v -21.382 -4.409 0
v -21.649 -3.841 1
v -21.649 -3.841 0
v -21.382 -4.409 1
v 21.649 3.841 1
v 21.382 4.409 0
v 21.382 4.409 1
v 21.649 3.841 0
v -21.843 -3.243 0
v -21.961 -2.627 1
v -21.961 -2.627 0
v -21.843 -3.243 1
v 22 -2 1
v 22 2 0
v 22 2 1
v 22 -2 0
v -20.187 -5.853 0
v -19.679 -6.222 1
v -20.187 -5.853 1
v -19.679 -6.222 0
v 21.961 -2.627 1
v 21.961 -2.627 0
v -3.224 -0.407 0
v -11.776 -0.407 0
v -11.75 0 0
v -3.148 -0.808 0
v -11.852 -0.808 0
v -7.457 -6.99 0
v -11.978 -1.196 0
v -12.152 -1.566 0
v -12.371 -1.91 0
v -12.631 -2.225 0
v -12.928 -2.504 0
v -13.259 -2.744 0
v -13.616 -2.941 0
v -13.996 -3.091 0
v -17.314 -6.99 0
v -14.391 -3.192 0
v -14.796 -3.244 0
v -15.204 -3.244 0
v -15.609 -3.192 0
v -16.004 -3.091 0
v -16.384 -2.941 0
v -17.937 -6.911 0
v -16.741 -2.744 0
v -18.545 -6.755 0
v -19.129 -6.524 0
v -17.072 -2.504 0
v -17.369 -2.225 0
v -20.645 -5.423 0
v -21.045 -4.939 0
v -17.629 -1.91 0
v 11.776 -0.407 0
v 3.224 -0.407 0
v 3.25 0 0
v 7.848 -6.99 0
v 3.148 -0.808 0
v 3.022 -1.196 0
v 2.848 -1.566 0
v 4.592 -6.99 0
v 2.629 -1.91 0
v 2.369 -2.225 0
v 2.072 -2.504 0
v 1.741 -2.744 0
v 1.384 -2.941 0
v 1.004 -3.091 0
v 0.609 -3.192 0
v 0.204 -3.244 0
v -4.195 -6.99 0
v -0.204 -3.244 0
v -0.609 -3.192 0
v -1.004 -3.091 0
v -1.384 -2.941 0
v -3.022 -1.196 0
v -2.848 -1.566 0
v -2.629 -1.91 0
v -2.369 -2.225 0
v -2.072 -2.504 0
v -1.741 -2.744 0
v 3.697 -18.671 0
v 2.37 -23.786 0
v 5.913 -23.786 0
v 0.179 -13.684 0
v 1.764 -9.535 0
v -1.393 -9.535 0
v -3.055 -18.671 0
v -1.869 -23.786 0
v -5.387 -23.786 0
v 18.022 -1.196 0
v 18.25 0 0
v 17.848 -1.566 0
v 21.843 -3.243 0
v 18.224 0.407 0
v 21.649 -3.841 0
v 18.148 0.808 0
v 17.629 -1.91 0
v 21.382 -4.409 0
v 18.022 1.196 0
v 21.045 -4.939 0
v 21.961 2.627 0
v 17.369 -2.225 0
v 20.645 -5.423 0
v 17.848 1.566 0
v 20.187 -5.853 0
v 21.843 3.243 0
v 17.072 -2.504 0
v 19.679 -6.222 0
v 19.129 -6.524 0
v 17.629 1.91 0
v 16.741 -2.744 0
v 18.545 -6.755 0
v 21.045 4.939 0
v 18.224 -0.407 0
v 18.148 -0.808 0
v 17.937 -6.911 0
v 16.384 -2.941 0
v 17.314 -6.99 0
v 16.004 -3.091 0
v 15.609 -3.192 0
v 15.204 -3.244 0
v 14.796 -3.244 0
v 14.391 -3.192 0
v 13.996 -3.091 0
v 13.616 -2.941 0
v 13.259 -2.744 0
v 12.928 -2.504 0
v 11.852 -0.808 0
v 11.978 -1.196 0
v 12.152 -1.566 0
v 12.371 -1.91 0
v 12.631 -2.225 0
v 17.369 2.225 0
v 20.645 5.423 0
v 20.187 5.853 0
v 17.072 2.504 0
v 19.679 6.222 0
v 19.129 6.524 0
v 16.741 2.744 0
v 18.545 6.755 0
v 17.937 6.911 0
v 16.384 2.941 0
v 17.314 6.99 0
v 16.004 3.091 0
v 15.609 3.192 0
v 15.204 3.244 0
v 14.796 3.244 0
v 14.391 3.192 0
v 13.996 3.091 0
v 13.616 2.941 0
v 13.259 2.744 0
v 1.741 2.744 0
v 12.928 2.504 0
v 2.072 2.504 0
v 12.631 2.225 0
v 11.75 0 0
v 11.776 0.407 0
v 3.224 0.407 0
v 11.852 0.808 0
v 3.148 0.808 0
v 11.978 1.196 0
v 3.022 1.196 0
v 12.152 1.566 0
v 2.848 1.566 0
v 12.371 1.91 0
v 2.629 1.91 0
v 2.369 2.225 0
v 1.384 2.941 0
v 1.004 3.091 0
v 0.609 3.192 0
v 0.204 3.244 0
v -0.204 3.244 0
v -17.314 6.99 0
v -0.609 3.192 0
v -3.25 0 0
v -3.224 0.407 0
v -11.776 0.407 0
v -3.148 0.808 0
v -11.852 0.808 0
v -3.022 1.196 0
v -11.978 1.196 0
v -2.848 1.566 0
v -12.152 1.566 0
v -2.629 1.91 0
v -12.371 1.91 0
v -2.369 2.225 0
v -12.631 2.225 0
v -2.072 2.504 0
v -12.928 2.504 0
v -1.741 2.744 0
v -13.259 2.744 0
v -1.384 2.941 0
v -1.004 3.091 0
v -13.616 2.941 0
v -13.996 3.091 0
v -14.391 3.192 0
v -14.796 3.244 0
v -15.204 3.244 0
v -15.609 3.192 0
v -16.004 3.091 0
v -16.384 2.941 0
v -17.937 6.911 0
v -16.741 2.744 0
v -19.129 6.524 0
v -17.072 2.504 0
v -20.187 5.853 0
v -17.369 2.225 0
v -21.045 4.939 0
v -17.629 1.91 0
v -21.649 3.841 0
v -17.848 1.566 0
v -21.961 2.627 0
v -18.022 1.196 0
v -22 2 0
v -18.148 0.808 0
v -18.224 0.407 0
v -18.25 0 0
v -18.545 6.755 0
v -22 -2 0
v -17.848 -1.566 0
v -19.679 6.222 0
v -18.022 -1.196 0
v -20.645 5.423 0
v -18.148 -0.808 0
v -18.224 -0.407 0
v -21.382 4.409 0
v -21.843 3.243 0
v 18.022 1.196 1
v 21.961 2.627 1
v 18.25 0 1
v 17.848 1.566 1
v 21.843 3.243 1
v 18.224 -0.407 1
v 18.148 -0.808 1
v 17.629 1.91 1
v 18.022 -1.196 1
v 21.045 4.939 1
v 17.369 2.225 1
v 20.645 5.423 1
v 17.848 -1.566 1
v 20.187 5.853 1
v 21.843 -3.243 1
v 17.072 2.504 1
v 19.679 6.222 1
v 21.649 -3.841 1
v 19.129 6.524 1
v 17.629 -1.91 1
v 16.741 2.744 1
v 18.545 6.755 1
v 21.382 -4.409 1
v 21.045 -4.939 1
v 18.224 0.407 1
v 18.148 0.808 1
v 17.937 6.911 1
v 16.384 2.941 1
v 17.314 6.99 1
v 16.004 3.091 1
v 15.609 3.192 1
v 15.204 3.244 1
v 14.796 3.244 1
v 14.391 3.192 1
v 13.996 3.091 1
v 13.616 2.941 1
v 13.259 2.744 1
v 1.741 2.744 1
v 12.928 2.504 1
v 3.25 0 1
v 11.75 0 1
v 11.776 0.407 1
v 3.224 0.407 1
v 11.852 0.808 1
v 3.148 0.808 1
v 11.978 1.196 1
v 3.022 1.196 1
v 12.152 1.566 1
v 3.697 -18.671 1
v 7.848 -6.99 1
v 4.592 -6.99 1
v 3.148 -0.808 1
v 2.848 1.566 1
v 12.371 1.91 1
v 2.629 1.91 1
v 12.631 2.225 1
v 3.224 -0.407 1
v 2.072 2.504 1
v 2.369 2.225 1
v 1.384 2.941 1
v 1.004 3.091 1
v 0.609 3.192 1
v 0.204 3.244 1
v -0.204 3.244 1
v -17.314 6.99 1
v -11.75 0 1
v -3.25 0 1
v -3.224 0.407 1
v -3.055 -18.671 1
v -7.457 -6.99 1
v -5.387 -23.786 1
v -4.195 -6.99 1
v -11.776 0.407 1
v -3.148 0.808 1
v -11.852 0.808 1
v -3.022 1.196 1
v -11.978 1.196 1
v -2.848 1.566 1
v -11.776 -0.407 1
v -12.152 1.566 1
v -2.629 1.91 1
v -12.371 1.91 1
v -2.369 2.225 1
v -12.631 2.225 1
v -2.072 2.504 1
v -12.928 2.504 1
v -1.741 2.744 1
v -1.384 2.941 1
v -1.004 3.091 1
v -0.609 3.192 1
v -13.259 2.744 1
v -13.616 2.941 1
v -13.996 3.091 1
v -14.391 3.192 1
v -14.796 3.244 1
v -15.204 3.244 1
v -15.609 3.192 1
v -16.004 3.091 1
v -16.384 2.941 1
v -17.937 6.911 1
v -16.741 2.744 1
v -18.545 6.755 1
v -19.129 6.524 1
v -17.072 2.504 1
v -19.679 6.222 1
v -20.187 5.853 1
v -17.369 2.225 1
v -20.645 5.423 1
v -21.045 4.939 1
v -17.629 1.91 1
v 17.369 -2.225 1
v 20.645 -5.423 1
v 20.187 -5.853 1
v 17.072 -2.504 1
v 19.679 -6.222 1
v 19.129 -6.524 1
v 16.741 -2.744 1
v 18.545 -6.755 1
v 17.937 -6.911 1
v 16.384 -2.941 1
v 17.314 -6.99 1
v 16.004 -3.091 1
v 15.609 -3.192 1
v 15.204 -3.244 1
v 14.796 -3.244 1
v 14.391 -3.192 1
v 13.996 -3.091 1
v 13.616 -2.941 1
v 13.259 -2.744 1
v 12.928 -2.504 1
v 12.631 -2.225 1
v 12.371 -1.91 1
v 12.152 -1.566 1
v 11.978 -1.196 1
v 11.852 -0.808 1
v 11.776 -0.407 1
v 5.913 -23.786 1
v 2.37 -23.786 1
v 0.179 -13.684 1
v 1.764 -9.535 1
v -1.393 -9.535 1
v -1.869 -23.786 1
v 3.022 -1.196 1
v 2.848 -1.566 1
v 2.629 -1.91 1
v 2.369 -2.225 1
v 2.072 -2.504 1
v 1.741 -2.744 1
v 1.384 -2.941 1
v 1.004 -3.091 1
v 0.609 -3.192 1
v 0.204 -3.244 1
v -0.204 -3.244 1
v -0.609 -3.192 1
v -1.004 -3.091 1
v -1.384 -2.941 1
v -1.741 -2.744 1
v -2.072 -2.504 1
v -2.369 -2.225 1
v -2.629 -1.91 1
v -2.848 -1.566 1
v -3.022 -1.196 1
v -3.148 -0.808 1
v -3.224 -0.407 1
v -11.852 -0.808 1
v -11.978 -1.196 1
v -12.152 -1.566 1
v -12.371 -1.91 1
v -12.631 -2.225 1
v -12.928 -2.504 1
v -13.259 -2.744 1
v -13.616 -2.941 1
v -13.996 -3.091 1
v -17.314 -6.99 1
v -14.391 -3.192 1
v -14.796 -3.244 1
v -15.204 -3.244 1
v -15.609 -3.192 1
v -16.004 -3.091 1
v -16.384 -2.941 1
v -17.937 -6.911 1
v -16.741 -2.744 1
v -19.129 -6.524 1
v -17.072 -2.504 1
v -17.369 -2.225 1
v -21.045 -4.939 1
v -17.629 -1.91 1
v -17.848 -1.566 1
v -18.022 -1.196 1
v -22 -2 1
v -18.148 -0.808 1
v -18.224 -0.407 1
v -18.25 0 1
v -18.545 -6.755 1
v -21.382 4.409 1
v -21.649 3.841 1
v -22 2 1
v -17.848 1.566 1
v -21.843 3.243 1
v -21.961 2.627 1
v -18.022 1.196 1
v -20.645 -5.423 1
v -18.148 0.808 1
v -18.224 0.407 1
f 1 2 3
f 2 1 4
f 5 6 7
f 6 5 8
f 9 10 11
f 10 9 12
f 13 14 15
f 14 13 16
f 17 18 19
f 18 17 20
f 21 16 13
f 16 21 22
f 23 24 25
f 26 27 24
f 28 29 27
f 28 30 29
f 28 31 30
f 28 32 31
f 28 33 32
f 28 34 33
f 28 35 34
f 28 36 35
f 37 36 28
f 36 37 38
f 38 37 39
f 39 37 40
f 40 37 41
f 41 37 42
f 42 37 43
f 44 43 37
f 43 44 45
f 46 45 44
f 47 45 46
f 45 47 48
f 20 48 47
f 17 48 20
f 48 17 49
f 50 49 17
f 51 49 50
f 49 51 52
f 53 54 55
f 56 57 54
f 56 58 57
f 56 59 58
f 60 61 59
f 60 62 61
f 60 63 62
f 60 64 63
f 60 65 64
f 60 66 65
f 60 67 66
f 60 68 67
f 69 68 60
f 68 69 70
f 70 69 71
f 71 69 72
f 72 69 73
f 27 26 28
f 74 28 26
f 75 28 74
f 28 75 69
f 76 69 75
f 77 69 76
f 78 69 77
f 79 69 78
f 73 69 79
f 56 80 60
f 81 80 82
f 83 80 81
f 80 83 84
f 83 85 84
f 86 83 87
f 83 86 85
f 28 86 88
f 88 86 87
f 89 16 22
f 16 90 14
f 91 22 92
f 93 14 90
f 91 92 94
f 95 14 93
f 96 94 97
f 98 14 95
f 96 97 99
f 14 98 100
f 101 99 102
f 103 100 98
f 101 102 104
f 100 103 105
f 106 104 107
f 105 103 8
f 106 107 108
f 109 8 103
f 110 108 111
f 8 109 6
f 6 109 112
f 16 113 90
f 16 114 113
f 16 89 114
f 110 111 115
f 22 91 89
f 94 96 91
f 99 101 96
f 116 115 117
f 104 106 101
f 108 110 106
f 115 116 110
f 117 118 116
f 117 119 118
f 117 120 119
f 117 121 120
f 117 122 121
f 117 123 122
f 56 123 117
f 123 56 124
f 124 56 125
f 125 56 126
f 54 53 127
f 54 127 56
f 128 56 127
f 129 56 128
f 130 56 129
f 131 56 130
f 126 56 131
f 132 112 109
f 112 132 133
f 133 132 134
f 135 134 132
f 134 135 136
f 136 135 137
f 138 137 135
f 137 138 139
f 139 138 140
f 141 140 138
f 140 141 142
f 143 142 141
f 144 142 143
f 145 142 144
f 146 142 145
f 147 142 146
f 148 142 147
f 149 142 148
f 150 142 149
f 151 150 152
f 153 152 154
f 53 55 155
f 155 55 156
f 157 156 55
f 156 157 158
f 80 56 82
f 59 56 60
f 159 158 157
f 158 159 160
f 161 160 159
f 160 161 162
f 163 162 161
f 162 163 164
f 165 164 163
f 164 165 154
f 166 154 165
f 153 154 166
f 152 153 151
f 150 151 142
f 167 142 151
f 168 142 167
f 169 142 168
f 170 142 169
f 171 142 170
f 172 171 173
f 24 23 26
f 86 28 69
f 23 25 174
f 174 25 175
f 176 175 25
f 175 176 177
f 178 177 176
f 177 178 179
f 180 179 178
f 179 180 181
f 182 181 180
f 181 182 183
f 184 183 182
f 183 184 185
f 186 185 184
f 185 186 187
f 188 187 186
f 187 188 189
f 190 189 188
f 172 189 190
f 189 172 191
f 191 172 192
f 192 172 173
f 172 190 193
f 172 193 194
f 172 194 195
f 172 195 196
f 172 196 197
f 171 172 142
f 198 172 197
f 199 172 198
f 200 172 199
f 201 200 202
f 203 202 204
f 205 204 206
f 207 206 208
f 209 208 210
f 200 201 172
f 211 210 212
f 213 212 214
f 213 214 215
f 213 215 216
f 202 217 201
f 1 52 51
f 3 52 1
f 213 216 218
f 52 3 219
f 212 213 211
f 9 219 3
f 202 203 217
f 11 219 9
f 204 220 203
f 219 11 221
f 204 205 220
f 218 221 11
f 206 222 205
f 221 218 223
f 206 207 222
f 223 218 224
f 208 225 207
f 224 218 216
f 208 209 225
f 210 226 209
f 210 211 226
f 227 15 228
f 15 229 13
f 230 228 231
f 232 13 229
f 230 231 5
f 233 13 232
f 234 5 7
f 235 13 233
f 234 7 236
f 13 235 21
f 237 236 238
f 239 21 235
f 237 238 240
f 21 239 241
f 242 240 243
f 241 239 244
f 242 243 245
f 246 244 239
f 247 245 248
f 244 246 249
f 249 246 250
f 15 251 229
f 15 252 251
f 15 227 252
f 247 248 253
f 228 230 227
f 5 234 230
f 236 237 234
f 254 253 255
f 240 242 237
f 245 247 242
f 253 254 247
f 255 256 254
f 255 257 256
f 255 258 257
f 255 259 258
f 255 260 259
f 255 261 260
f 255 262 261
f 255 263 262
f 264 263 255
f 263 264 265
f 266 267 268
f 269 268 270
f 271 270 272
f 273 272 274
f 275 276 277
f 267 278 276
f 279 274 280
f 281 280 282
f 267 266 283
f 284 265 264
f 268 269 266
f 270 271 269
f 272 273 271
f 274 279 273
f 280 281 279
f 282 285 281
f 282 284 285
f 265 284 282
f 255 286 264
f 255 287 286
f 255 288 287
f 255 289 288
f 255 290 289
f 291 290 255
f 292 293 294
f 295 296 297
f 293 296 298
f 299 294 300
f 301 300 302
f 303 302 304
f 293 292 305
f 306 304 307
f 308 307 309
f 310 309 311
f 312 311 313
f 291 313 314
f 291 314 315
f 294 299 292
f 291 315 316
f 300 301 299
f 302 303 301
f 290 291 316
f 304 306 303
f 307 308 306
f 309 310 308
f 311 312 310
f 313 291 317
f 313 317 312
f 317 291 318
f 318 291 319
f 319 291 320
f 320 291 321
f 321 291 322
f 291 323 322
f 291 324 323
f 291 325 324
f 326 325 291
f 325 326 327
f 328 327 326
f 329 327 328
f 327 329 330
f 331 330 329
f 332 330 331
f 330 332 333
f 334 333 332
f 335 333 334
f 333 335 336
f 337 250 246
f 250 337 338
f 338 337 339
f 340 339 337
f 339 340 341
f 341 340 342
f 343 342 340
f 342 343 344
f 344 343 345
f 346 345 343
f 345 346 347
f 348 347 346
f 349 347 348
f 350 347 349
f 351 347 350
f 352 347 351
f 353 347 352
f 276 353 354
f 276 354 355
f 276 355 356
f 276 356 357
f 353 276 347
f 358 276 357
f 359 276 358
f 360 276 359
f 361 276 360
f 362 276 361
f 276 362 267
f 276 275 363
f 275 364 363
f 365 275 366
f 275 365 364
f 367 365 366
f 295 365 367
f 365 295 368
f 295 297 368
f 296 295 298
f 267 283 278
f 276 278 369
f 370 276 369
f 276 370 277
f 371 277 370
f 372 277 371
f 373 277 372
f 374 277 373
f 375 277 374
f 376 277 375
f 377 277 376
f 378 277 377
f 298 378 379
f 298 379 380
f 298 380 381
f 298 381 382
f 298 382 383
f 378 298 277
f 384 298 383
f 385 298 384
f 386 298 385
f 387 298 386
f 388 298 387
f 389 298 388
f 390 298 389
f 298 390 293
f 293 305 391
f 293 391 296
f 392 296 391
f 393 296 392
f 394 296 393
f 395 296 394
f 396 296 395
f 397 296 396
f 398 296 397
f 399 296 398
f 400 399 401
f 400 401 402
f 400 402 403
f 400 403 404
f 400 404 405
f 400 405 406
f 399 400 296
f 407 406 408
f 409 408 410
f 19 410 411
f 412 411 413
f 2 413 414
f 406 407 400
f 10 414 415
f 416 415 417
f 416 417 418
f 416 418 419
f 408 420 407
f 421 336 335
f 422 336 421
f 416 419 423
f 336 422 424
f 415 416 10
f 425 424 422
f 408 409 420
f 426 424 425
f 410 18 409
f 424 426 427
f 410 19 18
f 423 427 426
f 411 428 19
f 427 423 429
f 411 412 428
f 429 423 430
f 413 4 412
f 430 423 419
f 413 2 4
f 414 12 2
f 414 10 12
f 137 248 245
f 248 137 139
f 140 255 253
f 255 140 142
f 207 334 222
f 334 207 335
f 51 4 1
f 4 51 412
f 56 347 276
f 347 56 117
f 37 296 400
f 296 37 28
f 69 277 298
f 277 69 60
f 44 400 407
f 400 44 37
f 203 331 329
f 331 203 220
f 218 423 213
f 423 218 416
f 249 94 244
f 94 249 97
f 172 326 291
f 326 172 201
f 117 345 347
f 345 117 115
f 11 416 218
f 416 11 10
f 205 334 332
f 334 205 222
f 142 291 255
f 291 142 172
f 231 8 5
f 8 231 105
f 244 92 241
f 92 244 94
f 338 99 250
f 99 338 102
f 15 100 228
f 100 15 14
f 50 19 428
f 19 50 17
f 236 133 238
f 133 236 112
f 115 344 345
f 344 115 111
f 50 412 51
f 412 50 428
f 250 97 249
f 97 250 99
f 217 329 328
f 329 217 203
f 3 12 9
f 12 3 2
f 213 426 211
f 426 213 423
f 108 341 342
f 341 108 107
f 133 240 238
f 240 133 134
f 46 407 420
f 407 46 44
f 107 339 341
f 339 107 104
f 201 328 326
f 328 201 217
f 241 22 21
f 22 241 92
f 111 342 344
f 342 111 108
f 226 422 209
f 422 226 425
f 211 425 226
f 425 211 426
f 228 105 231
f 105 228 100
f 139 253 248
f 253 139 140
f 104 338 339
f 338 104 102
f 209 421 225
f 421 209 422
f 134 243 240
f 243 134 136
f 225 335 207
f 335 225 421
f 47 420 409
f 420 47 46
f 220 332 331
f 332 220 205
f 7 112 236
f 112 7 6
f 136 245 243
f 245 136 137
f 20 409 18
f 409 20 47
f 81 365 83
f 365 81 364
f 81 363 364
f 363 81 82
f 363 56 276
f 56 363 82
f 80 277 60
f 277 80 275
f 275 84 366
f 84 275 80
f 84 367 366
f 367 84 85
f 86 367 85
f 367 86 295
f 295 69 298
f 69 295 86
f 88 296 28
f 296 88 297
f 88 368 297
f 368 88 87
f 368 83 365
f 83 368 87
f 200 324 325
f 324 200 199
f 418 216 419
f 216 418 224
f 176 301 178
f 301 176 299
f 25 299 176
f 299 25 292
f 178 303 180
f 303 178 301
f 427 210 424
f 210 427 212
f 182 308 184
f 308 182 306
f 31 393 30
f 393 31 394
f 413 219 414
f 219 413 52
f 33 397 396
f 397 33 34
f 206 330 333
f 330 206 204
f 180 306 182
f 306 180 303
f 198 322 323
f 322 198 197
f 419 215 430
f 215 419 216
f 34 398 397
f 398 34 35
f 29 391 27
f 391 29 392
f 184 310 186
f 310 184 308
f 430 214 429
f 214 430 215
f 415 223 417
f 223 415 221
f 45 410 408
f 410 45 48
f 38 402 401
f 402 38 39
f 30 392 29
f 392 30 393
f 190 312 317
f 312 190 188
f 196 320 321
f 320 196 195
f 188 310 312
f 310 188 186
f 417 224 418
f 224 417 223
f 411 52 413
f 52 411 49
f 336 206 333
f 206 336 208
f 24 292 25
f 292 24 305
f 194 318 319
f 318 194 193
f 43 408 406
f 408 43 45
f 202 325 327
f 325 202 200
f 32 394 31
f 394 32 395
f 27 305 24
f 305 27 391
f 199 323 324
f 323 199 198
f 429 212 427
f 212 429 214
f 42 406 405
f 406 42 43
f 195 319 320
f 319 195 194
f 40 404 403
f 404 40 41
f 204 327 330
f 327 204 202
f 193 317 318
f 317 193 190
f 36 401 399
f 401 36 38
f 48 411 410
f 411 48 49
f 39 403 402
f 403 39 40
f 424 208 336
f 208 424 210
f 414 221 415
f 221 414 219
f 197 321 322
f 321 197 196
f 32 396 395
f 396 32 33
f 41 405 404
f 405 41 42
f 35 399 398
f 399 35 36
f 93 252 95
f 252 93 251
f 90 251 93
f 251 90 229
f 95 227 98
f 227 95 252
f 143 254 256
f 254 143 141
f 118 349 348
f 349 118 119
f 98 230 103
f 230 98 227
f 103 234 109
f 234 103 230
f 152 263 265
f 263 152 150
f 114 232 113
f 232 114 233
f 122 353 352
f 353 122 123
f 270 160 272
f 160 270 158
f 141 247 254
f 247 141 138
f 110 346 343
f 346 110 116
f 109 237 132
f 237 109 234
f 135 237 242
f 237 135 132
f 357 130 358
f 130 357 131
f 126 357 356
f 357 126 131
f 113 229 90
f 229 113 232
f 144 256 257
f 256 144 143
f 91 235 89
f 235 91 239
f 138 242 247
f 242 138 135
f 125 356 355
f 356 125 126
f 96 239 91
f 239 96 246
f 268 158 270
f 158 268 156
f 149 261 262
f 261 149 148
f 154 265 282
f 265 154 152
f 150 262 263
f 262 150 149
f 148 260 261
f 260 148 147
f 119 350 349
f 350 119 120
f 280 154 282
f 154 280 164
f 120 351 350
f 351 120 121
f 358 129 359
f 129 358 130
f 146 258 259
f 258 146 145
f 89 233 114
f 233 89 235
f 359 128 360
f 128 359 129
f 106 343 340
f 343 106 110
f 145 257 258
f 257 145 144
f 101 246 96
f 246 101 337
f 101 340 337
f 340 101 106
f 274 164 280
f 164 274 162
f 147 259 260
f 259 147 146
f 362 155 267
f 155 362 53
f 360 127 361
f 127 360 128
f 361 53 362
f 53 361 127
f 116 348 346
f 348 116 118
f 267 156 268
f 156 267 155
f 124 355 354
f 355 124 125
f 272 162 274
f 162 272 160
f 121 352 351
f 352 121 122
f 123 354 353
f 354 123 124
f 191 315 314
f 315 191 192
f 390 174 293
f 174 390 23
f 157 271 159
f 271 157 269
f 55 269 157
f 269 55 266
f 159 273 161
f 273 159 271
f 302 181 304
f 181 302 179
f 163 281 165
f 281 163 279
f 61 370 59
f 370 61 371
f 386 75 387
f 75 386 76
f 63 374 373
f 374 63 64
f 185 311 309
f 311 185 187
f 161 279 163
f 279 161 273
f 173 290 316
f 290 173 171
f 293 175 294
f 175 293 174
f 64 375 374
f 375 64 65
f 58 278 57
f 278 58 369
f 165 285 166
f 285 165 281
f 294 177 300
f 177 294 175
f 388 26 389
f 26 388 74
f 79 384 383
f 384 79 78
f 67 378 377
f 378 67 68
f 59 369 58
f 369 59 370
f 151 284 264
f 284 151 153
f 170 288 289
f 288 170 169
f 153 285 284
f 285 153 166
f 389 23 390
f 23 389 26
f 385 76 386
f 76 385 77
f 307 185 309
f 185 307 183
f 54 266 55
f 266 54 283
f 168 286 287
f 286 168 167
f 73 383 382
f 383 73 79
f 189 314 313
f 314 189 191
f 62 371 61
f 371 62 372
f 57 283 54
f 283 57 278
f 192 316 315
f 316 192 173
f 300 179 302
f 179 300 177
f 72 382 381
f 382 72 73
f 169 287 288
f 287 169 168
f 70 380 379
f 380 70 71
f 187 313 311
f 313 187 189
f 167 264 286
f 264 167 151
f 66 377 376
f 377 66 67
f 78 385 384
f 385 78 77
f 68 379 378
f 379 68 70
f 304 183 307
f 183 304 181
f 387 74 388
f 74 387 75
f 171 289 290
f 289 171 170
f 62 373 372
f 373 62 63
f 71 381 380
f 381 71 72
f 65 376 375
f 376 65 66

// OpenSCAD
$fn = 50;


difference() {
	union() {
		translate(v = [0, 0, 0]) {
			rotate(a = [0, 0, 0]) {
				hull() {
					translate(v = [-17.0000000000, 2.0000000000, 0]) {
						rotate(a = [0, 0, 0]) {
							translate(v = [0, 0, 0]) {
								rotate(a = [0, 0, 0]) {
									cylinder(h = 1, r = 5);
								}
							}
						}
					}
					translate(v = [17.0000000000, 2.0000000000, 0]) {
						rotate(a = [0, 0, 0]) {
							translate(v = [0, 0, 0]) {
								rotate(a = [0, 0, 0]) {
									cylinder(h = 1, r = 5);
								}
							}
						}
					}
					translate(v = [-17.0000000000, -2.0000000000, 0]) {
						rotate(a = [0, 0, 0]) {
							translate(v = [0, 0, 0]) {
								rotate(a = [0, 0, 0]) {
									cylinder(h = 1, r = 5);
								}
							}
						}
					}
					translate(v = [17.0000000000, -2.0000000000, 0]) {
						rotate(a = [0, 0, 0]) {
							translate(v = [0, 0, 0]) {
								rotate(a = [0, 0, 0]) {
									cylinder(h = 1, r = 5);
								}
							}
						}
					}
				}
			}
		}
		translate(v = [0, -5, 0]) {
			rotate(a = [0, 0, 0]) {
				linear_extrude(height = 1) {
					text(font = "DejaVu Sans Mono:style=Bold", halign = "center", size = 19.0000000000, text = "W", valign = "top");
				}
			}
		}
	}
	union() {
		translate(v = [-15.0000000000, 0.0000000000, -125.0000000000]) {
			rotate(a = [0, 0, 0]) {
				cylinder(h = 250, r = 3.2500000000);
			}
		}
		translate(v = [15.0000000000, 0.0000000000, -125.0000000000]) {
			rotate(a = [0, 0, 0]) {
				cylinder(h = 250, r = 3.2500000000);
			}
		}
		translate(v = [15.0000000000, 0.0000000000, -125.0000000000]) {
			rotate(a = [0, 0, 0]) {
				cylinder(h = 250, r = 3.2500000000);
			}
		}
		translate(v = [0, 0, -125.0000000000]) {
			rotate(a = [0, 0, 0]) {
				cylinder(h = 250, r = 3.2500000000);
			}
		}
	}
}
